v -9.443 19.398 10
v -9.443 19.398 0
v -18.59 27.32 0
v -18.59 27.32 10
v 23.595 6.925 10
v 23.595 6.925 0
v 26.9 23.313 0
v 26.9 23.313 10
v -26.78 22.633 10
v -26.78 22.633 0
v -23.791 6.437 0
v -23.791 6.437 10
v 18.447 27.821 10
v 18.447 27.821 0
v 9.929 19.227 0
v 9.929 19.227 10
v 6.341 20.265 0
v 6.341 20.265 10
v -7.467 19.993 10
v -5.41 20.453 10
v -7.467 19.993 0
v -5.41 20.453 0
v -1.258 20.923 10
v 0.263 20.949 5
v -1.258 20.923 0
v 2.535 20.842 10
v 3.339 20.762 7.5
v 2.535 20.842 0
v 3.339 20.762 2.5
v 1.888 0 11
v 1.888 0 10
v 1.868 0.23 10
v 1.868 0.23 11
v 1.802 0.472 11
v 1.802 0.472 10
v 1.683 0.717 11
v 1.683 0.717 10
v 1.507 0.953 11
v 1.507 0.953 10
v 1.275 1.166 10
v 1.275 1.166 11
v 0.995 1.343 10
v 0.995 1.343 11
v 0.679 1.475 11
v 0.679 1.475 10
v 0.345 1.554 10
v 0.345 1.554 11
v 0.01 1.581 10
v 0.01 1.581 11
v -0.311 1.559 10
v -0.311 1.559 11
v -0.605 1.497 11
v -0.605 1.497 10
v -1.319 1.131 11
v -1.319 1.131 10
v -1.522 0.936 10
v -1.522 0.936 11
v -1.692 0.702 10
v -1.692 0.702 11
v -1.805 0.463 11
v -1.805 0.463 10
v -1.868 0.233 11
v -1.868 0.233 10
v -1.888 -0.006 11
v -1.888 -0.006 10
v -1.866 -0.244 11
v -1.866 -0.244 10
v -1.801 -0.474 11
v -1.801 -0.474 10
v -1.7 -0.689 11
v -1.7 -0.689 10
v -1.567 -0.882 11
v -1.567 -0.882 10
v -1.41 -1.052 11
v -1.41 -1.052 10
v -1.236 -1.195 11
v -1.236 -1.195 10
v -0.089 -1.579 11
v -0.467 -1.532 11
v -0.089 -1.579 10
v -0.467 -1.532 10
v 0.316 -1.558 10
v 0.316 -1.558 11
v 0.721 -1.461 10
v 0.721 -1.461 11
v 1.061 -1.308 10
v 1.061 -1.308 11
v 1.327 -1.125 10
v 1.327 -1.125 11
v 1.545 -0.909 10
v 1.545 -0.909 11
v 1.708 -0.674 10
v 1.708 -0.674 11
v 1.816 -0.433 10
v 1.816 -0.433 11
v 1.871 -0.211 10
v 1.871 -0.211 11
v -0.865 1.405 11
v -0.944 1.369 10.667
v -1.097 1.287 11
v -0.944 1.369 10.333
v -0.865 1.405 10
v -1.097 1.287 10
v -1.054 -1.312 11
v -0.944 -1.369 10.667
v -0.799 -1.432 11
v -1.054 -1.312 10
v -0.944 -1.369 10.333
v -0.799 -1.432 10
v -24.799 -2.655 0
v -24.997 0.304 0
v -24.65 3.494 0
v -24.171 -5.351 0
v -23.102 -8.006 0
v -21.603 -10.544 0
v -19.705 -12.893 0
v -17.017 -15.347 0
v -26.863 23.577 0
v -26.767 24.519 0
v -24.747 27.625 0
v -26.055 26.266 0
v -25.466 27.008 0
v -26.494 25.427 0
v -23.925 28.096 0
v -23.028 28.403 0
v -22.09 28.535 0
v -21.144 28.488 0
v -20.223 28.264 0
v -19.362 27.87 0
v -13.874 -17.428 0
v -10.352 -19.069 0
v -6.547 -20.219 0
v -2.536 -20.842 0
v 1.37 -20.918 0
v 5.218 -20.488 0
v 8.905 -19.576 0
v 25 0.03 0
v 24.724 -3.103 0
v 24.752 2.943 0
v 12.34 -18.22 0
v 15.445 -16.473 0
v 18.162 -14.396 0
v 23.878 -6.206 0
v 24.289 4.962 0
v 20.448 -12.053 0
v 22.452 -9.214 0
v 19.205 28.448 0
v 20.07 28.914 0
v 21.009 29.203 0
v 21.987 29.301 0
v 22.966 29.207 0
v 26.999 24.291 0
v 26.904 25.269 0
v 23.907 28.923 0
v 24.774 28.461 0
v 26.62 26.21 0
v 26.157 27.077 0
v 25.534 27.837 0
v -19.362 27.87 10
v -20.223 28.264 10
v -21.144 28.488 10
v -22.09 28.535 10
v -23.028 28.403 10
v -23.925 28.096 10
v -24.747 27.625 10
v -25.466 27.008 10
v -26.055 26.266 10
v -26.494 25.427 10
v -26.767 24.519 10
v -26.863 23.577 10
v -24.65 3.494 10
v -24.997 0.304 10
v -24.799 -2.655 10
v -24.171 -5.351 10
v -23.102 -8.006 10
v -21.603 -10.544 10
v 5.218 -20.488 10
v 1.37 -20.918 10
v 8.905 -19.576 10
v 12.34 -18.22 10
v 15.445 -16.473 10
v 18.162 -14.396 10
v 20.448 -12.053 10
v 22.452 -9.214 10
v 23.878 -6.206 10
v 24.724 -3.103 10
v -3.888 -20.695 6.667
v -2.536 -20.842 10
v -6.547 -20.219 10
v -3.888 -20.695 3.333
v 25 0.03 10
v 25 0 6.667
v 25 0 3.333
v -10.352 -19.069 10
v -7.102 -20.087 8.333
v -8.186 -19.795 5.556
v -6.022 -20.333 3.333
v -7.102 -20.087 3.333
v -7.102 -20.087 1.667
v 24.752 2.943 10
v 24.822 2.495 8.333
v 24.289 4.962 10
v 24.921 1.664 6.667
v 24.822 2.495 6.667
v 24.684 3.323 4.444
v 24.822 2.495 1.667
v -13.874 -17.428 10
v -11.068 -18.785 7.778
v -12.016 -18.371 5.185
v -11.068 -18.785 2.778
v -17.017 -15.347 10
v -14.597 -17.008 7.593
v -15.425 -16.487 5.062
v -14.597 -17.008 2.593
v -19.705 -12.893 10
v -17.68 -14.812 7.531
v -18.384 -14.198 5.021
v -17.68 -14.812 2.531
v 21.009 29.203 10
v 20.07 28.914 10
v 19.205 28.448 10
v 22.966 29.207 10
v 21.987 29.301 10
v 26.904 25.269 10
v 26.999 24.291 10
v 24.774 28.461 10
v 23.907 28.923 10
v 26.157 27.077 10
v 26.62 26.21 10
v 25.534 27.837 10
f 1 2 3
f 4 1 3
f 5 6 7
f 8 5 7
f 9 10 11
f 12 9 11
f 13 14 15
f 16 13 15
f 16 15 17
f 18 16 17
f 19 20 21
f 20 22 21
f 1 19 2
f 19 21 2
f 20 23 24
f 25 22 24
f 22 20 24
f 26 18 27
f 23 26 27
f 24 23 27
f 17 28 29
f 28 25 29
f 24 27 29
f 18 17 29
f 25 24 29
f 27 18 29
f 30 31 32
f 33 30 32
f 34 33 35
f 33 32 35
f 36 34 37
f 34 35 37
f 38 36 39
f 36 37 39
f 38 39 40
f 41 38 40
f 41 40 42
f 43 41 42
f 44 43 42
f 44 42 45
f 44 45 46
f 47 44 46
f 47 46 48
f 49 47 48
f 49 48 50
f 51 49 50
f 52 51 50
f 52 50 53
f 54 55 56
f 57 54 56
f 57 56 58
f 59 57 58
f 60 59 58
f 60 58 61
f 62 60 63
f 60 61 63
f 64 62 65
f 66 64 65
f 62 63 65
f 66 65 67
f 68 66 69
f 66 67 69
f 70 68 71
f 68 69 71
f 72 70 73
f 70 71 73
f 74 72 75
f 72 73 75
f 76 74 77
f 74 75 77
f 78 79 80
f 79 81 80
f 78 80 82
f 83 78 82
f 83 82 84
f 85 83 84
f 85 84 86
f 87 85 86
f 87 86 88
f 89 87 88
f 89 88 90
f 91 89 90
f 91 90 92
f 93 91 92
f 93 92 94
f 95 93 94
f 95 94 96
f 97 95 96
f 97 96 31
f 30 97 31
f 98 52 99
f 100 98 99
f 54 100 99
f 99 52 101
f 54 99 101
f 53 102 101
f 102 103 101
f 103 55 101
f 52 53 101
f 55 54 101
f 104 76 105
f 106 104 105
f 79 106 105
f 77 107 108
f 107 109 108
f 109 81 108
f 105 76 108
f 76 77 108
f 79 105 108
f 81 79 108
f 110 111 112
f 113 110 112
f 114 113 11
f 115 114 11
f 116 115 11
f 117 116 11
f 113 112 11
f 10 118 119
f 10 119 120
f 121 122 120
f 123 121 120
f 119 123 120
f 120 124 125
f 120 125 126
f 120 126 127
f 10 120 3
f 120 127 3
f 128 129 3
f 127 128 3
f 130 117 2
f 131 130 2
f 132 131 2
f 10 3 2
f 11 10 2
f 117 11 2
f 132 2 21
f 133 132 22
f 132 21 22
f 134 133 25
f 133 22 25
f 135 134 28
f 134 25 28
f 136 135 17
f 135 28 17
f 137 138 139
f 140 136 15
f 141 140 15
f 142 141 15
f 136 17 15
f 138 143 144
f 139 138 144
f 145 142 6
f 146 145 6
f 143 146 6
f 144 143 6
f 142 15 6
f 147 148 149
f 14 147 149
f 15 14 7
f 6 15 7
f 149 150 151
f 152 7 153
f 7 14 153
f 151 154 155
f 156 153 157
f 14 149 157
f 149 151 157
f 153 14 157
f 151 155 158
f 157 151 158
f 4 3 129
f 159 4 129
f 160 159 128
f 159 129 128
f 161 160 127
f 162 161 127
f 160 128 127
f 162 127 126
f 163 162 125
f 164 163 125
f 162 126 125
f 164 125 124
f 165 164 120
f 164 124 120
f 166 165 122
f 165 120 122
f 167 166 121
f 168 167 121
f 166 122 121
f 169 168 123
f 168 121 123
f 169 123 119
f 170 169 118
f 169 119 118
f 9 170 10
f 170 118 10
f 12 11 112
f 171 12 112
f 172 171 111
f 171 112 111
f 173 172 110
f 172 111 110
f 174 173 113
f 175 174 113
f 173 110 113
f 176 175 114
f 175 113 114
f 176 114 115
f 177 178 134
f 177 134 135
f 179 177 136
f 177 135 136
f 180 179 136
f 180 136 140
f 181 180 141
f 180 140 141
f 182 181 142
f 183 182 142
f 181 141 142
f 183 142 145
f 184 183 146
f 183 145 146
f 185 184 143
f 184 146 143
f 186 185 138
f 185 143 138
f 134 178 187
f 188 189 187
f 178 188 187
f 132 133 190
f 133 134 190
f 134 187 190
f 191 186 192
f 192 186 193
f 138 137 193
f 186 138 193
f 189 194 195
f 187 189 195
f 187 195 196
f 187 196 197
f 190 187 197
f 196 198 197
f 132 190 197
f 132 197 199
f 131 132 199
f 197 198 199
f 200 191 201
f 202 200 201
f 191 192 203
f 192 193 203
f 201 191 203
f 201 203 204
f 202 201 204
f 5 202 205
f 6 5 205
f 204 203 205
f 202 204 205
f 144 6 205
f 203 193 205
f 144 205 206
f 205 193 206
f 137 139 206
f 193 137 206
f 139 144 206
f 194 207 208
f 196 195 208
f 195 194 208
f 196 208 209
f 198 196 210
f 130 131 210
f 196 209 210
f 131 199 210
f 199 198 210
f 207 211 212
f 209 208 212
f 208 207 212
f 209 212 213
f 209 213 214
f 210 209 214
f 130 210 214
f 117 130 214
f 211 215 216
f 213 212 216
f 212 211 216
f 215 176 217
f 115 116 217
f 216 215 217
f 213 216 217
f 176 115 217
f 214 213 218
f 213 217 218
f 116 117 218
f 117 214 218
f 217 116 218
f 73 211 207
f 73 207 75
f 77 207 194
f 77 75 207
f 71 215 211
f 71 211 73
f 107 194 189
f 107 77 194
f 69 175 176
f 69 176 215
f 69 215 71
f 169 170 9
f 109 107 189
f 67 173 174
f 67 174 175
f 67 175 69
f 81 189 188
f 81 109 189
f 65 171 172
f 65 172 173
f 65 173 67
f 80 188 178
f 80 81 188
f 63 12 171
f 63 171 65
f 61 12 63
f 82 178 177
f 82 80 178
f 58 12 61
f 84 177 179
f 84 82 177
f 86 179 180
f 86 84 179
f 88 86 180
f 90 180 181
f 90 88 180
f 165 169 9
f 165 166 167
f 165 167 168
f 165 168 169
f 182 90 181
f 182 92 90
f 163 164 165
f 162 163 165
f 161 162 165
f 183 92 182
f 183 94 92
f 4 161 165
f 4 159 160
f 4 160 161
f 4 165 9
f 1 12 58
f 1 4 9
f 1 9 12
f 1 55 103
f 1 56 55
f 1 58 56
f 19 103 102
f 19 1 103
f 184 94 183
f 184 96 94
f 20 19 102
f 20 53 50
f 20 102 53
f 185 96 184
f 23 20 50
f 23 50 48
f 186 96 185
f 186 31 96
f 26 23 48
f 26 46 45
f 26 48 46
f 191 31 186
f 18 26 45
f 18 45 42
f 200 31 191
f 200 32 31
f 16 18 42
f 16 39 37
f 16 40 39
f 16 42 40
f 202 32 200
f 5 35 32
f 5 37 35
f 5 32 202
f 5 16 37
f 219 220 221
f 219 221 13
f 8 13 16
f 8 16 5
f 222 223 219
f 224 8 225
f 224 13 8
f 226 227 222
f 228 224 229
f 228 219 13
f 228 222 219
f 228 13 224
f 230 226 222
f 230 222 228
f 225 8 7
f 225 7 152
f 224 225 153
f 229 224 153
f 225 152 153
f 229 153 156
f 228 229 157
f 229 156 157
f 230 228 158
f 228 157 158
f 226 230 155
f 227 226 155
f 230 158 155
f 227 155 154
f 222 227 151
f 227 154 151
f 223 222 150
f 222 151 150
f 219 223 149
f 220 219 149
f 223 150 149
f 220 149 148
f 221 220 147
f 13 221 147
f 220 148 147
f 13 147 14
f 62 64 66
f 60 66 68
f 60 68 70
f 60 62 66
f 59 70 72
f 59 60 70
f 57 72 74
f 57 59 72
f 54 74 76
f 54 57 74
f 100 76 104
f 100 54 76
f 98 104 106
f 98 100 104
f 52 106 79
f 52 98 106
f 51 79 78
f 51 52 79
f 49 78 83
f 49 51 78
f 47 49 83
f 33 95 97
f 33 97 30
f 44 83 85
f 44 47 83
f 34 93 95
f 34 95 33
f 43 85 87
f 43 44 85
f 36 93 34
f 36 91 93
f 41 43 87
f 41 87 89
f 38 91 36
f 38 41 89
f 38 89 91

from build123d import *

# Parameters (mm, degrees)
F1_DEPTH = 10
F2_DEPTH = 11


with BuildPart() as f1:
    # F0 (on Top) → F1 (new body)
    with BuildSketch(Plane.XY):
        with BuildLine():
            add(Edge.make_bspline(
                [(-23.790544, 6.437249), (-32.776427, -16.883344), (-3.888213, -20.694751), (25, -24.506157), (25, 0)],
                knots=[2.829268, 2.829268, 2.829268, 4.556226, 4.556226, 6.283185, 6.283185, 6.283185], degree=2, weights=[1, 0.649797, 1, 0.649797, 1]))
            add(Edge.make_bspline(
                [(25, 0), (25, 3.562754), (23.594584, 6.925222)],
                knots=[0, 0, 0, 0.336902, 0.336902, 0.336902], degree=2, weights=[1, 0.985846, 1]))
            add(Edge.make_bspline(
                [(23.594584, 6.925222), (19.975762, 15.583283), (9.928744, 19.226648)],
                knots=[0.336902, 0.336902, 0.336902, 1.162387, 1.162387, 1.162387], degree=2, weights=[1, 0.916024, 1]))
            add(Edge.make_bspline(
                [(9.928744, 19.226648), (0.285784, 22.723488), (-9.442982, 19.39773)],
                knots=[1.162387, 1.162387, 1.162387, 1.958128, 1.958128, 1.958128], degree=2, weights=[1, 0.921888, 1]))
            add(Edge.make_bspline(
                [(-9.442982, 19.39773), (-20.215591, 15.715136), (-23.790544, 6.437249)],
                knots=[1.958128, 1.958128, 1.958128, 2.829268, 2.829268, 2.829268], degree=2, weights=[1, 0.90663, 1]))
        make_face()
        with BuildLine():
            add(Edge.make_bspline(
                [(1.888386, 0), (1.888386, 2.737699), (-0.944193, 1.36885), (-3.776772, 0), (-0.944193, -1.36885), (1.888386, -2.737699), (1.888386, 0)],
                knots=[0, 0, 0, 2.094395, 2.094395, 4.18879, 4.18879, 6.283185, 6.283185, 6.283185], degree=2, weights=[1, 0.5, 1, 0.5, 1, 0.5, 1]))
        make_face(mode=Mode.SUBTRACT)
        with BuildLine():
            Line((-26.780493, 22.632769), (-23.790544, 6.437249))
            add(Edge.make_bspline(
                [(-9.442982, 19.39773), (-20.215591, 15.715136), (-23.790544, 6.437249)],
                knots=[1.958128, 1.958128, 1.958128, 2.829268, 2.829268, 2.829268], degree=2, weights=[1, 0.90663, 1]))
            Line((-9.442982, 19.39773), (-18.590172, 27.32003))
            ThreePointArc((-18.590172, 27.32003), (-24.347103, 27.880108), (-26.780493, 22.632769))
        make_face()
        with BuildLine():
            add(Edge.make_bspline(
                [(23.594584, 6.925222), (19.975762, 15.583283), (9.928744, 19.226648)],
                knots=[0.336902, 0.336902, 0.336902, 1.162387, 1.162387, 1.162387], degree=2, weights=[1, 0.916024, 1]))
            Line((23.594584, 6.925222), (26.899845, 23.312925))
            ThreePointArc((26.899845, 23.312925), (24.351622, 28.713168), (18.447337, 27.821269))
            Line((18.447337, 27.821269), (9.928744, 19.226648))
        make_face()
    extrude(amount=F1_DEPTH)

    # F0 (on Top) → F2 (join)
    with BuildSketch(Plane.XY):
        with BuildLine():
            add(Edge.make_bspline(
                [(1.888386, 0), (1.888386, 2.737699), (-0.944193, 1.36885), (-3.776772, 0), (-0.944193, -1.36885), (1.888386, -2.737699), (1.888386, 0)],
                knots=[0, 0, 0, 2.094395, 2.094395, 4.18879, 4.18879, 6.283185, 6.283185, 6.283185], degree=2, weights=[1, 0.5, 1, 0.5, 1, 0.5, 1]))
        make_face()
    extrude(amount=F2_DEPTH)


solid = f1.part
